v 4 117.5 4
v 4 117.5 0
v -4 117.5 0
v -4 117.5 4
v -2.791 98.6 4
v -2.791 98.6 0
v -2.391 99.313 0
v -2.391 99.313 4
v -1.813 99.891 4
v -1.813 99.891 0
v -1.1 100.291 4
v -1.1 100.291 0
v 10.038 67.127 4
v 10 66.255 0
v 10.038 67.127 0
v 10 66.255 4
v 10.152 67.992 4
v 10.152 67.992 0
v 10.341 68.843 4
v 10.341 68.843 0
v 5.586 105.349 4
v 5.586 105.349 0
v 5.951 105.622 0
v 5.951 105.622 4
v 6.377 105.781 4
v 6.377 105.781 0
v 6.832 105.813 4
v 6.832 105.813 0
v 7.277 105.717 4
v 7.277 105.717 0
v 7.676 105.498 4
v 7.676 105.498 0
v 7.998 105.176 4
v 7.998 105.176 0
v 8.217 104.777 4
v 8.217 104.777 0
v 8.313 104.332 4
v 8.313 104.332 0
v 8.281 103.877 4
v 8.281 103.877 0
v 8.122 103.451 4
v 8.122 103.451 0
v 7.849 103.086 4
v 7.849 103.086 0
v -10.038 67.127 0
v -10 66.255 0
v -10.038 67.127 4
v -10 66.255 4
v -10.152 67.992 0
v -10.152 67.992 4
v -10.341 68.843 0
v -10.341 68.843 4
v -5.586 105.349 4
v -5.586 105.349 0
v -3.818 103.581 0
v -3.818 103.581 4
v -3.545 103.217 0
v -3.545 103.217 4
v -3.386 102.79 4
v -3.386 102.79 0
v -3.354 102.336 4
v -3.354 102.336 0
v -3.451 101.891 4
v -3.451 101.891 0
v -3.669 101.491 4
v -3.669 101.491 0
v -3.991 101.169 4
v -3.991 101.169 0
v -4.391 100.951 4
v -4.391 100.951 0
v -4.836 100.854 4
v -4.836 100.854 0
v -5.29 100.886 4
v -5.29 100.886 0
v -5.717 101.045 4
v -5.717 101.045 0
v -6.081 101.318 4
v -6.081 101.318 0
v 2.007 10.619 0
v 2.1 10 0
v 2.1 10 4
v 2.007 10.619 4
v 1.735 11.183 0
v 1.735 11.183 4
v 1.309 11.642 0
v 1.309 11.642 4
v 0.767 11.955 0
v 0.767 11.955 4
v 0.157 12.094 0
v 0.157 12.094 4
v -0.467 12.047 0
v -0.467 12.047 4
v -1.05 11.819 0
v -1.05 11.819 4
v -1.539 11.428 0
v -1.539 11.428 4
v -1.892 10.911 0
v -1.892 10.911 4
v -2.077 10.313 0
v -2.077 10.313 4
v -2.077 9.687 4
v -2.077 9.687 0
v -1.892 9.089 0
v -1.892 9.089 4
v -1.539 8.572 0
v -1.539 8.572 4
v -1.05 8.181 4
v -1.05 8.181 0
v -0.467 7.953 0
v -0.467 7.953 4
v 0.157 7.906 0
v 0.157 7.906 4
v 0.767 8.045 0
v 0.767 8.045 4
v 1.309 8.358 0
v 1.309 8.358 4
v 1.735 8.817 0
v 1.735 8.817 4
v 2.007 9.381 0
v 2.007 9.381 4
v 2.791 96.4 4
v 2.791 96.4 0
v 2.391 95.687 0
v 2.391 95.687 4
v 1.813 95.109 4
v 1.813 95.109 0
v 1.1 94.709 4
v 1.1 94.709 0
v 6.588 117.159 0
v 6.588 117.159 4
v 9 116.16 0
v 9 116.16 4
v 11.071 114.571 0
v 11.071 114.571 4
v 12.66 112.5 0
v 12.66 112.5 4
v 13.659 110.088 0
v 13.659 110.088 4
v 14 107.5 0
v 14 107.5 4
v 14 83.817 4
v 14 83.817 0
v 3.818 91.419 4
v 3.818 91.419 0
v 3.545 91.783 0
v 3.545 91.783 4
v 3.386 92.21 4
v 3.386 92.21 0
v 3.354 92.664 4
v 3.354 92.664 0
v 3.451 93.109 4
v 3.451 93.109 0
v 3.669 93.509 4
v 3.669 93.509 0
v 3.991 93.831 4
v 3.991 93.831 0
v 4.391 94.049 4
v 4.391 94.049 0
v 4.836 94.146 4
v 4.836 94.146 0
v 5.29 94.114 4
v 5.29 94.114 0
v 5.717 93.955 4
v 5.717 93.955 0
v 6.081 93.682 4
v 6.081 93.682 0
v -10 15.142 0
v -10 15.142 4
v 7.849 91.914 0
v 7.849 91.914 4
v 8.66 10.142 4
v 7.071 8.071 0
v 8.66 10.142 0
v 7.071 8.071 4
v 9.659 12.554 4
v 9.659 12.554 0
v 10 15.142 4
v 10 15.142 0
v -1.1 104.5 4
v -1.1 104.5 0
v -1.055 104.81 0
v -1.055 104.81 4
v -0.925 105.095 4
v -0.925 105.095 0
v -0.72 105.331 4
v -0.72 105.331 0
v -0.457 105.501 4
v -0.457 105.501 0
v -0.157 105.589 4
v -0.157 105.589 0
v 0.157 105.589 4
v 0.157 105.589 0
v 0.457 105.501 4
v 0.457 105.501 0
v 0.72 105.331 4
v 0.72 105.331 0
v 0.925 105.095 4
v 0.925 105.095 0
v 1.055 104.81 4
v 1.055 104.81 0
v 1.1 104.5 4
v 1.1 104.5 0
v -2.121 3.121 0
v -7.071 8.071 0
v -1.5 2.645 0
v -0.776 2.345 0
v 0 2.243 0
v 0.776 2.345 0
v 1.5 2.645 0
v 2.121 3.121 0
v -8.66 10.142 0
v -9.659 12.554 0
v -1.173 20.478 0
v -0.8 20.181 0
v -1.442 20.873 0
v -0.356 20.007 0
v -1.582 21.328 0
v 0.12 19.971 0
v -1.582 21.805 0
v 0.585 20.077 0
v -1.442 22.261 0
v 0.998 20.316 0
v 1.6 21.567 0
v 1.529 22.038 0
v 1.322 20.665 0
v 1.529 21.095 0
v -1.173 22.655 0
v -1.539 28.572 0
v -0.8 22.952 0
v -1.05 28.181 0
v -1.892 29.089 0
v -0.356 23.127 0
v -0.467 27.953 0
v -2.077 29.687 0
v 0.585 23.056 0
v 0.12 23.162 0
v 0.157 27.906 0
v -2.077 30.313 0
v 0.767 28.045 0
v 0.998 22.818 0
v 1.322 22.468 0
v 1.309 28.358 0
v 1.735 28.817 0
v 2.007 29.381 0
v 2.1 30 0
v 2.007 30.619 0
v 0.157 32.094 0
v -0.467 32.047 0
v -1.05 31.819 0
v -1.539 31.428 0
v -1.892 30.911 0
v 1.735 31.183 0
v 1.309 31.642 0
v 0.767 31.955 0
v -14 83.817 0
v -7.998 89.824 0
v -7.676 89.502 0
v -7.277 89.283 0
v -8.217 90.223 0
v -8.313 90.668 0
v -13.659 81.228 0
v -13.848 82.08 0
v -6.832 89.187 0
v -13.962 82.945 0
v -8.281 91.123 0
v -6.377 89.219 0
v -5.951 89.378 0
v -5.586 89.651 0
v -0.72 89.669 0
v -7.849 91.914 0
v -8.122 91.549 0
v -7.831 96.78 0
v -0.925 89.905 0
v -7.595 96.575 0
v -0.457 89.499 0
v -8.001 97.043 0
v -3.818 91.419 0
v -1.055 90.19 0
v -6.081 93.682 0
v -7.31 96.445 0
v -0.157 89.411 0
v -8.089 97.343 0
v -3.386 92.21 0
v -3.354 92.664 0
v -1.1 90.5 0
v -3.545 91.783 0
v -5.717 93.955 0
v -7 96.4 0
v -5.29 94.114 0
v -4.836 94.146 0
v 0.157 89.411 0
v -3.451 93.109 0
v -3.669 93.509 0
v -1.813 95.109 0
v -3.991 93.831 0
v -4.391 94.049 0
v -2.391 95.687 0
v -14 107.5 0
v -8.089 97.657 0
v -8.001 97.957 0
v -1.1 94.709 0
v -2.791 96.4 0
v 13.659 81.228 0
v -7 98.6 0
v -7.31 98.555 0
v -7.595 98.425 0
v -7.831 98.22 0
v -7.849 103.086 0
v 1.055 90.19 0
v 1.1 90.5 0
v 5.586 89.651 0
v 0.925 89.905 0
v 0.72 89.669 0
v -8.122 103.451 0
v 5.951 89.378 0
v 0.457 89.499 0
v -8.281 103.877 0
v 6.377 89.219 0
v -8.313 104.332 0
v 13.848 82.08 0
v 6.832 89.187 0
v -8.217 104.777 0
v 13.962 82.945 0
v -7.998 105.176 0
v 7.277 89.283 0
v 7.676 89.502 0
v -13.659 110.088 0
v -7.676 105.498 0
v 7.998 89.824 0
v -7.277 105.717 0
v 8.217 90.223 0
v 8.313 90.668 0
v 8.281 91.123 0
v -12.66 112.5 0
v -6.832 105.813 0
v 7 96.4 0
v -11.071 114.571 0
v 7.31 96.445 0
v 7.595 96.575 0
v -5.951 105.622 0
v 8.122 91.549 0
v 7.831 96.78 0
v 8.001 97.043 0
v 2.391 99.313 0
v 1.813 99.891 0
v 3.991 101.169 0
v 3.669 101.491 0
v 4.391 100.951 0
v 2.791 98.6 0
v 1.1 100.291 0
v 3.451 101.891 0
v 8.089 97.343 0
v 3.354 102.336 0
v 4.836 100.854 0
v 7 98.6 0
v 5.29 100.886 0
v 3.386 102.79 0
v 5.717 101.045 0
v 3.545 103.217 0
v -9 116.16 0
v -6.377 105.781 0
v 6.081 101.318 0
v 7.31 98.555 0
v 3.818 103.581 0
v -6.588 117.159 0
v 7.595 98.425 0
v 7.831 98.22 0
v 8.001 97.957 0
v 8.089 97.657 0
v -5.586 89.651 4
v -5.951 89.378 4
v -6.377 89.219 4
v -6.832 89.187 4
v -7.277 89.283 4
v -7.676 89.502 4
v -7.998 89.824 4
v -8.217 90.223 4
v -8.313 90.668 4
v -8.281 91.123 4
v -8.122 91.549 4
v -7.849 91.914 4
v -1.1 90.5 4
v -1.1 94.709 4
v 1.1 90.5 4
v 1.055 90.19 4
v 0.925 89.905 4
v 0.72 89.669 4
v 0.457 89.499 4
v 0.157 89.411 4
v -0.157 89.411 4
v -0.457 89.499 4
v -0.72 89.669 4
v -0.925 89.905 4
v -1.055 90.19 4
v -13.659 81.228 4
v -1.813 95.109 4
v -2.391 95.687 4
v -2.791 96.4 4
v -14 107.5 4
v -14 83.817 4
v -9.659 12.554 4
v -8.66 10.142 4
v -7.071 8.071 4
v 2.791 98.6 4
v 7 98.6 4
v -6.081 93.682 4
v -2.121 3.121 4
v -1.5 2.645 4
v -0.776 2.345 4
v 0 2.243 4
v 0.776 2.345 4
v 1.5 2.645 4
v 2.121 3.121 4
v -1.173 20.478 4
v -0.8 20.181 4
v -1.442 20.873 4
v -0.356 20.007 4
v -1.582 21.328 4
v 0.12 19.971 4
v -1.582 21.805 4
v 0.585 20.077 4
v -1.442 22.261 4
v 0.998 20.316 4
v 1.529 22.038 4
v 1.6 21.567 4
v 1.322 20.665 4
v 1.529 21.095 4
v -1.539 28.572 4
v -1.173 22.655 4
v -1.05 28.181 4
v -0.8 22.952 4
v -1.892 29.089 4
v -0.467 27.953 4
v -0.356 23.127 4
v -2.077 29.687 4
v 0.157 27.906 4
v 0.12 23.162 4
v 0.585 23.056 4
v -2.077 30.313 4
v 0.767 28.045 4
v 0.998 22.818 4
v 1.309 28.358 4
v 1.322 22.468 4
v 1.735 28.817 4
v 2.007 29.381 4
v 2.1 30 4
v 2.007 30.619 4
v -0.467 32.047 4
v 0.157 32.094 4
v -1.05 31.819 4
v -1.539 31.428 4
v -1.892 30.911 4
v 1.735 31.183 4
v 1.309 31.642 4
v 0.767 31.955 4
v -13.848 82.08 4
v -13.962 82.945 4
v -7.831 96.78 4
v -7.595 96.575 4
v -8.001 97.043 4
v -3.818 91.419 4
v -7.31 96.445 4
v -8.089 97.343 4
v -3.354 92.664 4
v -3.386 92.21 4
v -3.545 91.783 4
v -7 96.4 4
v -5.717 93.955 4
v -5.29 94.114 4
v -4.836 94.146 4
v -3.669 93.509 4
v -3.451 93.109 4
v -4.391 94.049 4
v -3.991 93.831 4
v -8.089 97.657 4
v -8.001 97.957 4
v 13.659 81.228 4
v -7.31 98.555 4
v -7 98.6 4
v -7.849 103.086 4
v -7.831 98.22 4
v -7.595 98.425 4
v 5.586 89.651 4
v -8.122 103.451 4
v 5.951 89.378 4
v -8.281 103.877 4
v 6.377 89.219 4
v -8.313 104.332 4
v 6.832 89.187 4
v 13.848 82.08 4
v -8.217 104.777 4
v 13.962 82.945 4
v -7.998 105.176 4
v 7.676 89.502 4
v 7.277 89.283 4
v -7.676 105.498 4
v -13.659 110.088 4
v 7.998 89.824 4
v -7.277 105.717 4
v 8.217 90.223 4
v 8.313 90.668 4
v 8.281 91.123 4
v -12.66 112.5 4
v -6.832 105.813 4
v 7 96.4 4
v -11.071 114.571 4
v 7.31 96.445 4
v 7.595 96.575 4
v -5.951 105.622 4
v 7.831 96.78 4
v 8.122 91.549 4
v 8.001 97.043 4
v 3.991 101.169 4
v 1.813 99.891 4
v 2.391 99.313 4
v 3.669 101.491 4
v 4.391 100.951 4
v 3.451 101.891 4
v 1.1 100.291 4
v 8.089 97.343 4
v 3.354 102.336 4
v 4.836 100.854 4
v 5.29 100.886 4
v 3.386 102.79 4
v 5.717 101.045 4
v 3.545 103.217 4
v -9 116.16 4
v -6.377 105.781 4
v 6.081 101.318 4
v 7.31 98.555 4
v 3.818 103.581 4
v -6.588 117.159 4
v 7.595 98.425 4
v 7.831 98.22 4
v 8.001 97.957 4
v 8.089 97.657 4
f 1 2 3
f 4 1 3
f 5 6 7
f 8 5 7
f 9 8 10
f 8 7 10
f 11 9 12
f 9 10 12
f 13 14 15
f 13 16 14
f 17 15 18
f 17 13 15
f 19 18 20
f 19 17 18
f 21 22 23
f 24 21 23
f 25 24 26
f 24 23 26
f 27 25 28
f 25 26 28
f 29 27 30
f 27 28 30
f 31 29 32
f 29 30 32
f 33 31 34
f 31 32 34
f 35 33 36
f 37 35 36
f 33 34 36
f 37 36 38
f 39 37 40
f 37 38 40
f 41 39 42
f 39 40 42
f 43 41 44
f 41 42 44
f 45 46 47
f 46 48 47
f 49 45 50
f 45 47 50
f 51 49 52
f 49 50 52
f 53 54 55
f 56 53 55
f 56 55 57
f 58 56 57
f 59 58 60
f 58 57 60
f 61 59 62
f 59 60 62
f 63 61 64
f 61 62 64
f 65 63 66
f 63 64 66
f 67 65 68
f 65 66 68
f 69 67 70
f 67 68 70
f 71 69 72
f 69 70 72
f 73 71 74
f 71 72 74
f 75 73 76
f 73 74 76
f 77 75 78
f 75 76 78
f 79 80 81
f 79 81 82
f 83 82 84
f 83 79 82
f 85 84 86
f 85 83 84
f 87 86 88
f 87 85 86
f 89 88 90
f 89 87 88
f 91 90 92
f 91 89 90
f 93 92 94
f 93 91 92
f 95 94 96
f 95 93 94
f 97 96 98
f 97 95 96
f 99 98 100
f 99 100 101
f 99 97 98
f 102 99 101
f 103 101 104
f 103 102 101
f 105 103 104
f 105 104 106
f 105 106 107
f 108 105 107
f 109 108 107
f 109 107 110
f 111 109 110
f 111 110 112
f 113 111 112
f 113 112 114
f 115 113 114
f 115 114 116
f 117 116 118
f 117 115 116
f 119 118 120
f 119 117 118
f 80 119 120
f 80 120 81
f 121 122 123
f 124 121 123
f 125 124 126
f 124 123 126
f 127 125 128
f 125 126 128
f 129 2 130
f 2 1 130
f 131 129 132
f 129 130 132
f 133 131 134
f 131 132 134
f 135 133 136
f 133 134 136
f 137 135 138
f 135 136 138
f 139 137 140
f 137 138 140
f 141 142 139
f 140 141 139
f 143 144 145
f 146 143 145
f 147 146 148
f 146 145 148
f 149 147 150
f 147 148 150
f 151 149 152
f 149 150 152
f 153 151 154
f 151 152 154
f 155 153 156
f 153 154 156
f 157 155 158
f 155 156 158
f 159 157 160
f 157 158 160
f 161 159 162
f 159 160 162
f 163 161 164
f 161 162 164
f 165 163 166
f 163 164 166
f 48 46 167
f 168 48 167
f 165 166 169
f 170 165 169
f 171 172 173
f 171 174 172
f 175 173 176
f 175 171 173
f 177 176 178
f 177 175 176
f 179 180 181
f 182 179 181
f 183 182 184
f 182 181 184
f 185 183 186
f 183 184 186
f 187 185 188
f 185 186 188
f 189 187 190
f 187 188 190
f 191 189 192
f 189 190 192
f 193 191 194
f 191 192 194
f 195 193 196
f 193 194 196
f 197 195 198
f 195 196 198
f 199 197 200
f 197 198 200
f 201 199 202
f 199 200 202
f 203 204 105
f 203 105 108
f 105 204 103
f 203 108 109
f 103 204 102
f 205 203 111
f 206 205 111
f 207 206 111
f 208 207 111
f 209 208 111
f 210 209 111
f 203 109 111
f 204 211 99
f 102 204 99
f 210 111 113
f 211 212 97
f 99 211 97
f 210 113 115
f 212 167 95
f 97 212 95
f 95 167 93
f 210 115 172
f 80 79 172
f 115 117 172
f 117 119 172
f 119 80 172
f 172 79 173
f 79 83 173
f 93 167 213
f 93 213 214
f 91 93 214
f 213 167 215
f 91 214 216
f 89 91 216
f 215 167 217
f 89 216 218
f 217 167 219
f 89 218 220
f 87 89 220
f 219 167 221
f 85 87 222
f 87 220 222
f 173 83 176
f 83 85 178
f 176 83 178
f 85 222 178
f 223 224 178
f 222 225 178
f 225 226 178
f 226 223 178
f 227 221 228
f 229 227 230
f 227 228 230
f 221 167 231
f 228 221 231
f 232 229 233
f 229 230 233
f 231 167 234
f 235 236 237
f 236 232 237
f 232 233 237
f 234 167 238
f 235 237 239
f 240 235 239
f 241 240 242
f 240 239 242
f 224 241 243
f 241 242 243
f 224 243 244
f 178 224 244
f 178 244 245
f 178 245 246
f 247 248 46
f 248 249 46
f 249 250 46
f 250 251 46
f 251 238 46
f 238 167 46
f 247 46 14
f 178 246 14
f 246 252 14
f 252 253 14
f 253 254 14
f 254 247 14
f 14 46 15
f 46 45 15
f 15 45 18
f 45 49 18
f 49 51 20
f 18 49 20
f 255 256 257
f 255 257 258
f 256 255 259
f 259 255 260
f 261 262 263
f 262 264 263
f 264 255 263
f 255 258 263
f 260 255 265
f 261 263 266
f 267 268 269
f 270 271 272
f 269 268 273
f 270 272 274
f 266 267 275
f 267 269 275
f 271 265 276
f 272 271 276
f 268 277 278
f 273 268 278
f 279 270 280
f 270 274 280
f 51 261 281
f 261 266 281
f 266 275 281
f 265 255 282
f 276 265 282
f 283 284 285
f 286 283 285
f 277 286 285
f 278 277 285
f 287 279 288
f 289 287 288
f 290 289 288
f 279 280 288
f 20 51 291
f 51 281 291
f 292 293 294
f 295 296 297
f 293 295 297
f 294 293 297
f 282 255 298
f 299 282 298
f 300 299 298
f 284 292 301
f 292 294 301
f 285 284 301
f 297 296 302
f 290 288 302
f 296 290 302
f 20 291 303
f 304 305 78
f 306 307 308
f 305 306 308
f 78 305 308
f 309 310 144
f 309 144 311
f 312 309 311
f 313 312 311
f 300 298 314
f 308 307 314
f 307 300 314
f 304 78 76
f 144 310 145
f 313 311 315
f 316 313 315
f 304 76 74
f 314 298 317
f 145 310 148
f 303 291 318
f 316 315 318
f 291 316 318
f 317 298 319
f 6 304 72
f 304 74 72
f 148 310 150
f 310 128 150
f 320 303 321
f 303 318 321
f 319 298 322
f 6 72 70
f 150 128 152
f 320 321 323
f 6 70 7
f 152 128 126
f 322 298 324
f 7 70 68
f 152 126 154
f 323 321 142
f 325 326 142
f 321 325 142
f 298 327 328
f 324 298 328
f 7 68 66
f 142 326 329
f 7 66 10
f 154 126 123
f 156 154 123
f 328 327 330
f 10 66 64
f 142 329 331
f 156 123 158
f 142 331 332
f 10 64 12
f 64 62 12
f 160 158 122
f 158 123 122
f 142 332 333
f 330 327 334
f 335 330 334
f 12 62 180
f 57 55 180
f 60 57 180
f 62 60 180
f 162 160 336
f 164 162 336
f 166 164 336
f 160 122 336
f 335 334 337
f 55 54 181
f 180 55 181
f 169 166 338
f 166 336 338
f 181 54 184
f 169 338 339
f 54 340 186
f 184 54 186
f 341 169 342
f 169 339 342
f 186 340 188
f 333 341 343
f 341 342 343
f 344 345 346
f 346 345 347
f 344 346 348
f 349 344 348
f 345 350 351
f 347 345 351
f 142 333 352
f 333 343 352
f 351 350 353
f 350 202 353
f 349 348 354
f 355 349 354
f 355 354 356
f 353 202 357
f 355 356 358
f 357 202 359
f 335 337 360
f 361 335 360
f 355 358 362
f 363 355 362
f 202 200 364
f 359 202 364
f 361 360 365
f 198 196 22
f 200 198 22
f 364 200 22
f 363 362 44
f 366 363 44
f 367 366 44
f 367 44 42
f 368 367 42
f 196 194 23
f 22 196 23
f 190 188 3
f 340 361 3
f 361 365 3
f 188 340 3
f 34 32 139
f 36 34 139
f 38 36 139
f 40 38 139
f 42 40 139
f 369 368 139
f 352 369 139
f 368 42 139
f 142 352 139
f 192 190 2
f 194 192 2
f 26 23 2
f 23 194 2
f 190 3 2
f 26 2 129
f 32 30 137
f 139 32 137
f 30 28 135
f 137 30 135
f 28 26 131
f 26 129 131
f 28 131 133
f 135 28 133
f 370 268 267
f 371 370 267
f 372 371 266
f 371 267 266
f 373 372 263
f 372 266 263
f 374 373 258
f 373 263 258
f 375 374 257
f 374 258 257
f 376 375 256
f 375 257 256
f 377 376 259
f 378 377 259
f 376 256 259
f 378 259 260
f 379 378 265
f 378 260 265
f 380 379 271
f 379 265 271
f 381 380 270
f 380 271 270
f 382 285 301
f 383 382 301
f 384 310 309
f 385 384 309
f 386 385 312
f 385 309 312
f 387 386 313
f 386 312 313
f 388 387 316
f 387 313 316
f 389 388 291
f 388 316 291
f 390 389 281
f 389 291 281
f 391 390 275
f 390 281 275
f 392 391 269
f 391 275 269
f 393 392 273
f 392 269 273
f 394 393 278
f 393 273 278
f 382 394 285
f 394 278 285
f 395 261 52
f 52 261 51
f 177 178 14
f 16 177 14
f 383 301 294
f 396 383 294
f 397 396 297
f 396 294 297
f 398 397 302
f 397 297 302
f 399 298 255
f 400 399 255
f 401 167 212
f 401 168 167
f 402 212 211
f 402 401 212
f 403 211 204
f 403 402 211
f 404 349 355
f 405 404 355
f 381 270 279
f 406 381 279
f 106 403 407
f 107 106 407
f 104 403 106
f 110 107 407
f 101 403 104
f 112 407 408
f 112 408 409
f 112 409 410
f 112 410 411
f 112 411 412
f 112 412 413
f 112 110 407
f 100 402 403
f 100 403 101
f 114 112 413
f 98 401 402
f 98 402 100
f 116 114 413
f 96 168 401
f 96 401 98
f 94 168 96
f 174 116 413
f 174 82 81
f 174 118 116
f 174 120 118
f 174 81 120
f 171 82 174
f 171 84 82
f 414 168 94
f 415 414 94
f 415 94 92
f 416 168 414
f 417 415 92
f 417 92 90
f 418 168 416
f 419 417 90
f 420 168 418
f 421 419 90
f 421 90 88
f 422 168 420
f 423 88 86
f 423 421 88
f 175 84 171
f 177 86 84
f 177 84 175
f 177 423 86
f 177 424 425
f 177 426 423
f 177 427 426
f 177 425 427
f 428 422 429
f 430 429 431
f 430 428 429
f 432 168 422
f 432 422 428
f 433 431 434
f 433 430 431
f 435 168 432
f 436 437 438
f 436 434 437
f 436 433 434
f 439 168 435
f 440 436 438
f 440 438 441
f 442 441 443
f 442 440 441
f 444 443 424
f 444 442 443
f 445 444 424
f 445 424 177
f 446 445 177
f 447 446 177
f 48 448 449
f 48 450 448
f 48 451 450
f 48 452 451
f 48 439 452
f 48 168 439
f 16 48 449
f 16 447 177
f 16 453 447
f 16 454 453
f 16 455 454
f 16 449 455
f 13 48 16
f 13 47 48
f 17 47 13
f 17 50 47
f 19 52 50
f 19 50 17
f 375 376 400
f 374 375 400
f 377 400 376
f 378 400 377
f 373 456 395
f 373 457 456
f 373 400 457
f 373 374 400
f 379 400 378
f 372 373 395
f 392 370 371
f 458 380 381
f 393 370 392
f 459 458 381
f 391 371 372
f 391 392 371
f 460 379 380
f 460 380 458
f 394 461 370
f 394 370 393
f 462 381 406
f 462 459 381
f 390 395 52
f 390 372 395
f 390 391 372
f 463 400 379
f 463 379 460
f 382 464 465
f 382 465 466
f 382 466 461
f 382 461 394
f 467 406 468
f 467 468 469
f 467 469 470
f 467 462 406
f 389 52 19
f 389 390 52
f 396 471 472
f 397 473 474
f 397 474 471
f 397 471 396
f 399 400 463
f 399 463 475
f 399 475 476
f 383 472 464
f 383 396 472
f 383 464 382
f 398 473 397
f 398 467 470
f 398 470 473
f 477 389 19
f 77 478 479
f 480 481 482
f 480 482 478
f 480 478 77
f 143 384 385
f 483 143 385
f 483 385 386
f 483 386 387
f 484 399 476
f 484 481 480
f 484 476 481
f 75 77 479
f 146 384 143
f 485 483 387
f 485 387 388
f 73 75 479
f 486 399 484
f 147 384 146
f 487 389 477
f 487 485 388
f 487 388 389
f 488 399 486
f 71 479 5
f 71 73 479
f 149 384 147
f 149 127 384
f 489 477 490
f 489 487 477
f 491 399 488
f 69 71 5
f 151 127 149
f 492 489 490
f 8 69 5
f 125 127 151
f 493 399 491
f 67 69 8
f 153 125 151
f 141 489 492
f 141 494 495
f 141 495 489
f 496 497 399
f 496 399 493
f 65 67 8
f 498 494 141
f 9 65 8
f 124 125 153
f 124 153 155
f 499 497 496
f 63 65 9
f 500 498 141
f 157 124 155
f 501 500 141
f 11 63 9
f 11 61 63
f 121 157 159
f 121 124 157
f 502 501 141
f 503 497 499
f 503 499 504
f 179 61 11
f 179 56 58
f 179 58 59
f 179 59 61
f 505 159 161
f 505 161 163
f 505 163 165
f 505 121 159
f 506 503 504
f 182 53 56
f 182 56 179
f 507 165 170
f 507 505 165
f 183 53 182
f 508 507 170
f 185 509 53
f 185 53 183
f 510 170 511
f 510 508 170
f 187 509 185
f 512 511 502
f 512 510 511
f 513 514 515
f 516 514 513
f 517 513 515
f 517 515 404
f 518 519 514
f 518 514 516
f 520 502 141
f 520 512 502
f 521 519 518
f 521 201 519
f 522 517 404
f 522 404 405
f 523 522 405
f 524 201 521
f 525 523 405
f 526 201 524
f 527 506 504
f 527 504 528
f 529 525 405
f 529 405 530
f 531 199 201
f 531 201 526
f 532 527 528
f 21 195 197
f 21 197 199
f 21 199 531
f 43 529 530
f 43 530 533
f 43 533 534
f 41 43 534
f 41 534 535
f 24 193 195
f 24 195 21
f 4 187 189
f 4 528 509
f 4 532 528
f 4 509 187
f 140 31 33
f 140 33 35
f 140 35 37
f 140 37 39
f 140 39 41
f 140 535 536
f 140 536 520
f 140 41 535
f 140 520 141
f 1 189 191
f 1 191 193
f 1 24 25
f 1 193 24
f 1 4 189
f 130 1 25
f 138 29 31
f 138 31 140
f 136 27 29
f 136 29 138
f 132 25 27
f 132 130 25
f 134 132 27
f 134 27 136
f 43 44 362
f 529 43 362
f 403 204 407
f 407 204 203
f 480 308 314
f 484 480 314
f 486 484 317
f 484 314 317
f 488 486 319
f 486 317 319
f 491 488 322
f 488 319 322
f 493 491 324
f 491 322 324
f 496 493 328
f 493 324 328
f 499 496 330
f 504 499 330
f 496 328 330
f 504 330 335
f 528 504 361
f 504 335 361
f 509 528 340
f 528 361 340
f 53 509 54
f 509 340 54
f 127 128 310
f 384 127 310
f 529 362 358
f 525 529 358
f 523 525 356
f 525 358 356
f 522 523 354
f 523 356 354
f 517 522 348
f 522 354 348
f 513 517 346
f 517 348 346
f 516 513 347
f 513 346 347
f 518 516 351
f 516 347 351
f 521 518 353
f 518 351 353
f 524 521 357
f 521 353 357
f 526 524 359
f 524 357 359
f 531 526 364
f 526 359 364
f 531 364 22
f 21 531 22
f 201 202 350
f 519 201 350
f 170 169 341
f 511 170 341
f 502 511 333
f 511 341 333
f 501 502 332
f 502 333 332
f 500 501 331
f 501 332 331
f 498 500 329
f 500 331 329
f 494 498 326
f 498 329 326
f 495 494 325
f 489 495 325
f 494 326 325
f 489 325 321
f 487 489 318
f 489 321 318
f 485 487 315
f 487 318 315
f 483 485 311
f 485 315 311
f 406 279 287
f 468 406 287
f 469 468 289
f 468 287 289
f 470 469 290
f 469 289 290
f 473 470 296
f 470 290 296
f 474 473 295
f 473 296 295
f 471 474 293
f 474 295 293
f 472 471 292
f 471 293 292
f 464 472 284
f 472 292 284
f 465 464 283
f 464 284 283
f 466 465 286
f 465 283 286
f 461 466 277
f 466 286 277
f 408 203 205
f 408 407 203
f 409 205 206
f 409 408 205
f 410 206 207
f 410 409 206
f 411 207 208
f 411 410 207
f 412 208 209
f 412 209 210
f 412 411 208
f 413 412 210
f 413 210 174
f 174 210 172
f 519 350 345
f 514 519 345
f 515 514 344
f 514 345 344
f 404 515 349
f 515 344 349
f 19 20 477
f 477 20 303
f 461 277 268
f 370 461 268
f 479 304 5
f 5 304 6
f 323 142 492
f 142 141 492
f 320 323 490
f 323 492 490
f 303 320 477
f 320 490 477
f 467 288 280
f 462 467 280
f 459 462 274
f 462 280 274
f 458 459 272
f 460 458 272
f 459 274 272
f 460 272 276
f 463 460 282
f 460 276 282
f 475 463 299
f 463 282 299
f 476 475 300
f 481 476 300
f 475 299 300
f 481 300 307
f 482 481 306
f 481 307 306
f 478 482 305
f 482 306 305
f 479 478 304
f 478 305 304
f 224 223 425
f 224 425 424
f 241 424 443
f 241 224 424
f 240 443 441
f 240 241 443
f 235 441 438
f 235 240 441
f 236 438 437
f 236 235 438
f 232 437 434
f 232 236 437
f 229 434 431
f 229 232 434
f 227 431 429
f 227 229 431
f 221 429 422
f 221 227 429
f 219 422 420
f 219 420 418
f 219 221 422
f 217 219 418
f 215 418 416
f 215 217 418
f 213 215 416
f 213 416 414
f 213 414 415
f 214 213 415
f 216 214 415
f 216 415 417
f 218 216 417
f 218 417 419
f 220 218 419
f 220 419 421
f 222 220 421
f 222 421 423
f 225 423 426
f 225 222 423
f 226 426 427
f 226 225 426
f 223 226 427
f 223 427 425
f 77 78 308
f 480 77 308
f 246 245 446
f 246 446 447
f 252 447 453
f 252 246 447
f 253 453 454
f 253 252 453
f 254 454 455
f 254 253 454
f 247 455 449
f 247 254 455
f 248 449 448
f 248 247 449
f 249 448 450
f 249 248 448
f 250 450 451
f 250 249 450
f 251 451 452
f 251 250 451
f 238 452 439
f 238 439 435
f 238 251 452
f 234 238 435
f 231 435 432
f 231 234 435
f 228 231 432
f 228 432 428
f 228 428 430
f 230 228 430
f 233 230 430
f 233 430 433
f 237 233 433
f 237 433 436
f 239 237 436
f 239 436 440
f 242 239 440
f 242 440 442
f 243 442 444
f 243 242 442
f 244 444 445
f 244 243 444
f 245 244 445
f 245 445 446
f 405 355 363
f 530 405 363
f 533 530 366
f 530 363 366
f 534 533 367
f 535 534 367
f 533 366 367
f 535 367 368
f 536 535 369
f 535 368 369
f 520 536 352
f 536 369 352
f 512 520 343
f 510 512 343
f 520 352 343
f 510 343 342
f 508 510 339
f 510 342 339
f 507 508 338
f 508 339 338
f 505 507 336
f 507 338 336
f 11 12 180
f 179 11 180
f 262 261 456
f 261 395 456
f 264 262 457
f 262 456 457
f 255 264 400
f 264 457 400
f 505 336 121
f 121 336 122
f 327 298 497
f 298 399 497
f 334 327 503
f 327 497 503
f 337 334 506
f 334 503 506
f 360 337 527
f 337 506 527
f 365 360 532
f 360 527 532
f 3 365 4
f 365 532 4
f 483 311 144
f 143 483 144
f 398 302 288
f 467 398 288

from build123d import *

# Parameters (mm, degrees)
F0_R     = 2.1
F0_R_2   = 1.6
F1_DEPTH = 4
F2_R     = 10
F3_R     = 3


with BuildPart() as f1:
    # F0 (on Top) → F1 (new body)
    with BuildSketch(Plane.XY):
        Polygon((-10, 67.571797), (-10, 11), (0, 1), (10, 11), (10, 67.571797), (14, 82.5), (14, 117.5), (-14, 117.5), (-14, 82.5), align=None)
        with Locations((0, 10)):
            Circle(F0_R, mode=Mode.SUBTRACT)
        with Locations((0, 21.566757)):
            Circle(F0_R_2, mode=Mode.SUBTRACT)
        with Locations((0, 30)):
            Circle(F0_R, mode=Mode.SUBTRACT)
        with BuildLine():
            ThreePointArc((-5.586144, 89.651115), (-7.848885, 89.651115), (-7.848885, 91.913856))
            Line((-7.848885, 91.913856), (-6.081118, 93.681623))
            ThreePointArc((-6.081118, 93.681623), (-3.818377, 93.681623), (-3.818377, 91.418882))
            Line((-3.818377, 91.418882), (-5.586144, 89.651115))
        make_face(mode=Mode.SUBTRACT)
        with BuildLine():
            ThreePointArc((-7.848885, 103.086144), (-7.848885, 105.348885), (-5.586144, 105.348885))
            Line((-5.586144, 105.348885), (-3.818377, 103.581118))
            ThreePointArc((-3.818377, 103.581118), (-3.818377, 101.318377), (-6.081118, 101.318377))
            Line((-6.081118, 101.318377), (-7.848885, 103.086144))
        make_face(mode=Mode.SUBTRACT)
        with BuildLine():
            ThreePointArc((1.1, 100.291057), (2.12132, 99.62132), (2.791057, 98.6))
            Line((2.791057, 98.6), (7, 98.6))
            ThreePointArc((7, 98.6), (8.1, 97.5), (7, 96.4))
            Line((7, 96.4), (2.791057, 96.4))
            ThreePointArc((2.791057, 96.4), (2.12132, 95.37868), (1.1, 94.708943))
            Line((1.1, 94.708943), (1.1, 90.5))
            ThreePointArc((1.1, 90.5), (0, 89.4), (-1.1, 90.5))
            Line((-1.1, 90.5), (-1.1, 94.708943))
            ThreePointArc((-1.1, 94.708943), (-2.12132, 95.37868), (-2.791057, 96.4))
            Line((-2.791057, 96.4), (-7, 96.4))
            ThreePointArc((-7, 96.4), (-8.1, 97.5), (-7, 98.6))
            Line((-7, 98.6), (-2.791057, 98.6))
            ThreePointArc((-2.791057, 98.6), (-2.12132, 99.62132), (-1.1, 100.291057))
            Line((-1.1, 100.291057), (-1.1, 104.5))
            ThreePointArc((-1.1, 104.5), (0, 105.6), (1.1, 104.5))
            Line((1.1, 104.5), (1.1, 100.291057))
        make_face(mode=Mode.SUBTRACT)
        with BuildLine():
            ThreePointArc((7.848885, 91.913856), (7.848885, 89.651115), (5.586144, 89.651115))
            Line((5.586144, 89.651115), (3.818377, 91.418882))
            ThreePointArc((3.818377, 91.418882), (3.818377, 93.681623), (6.081118, 93.681623))
            Line((6.081118, 93.681623), (7.848885, 91.913856))
        make_face(mode=Mode.SUBTRACT)
        with BuildLine():
            ThreePointArc((5.586144, 105.348885), (7.848885, 105.348885), (7.848885, 103.086144))
            Line((7.848885, 103.086144), (6.081118, 101.318377))
            ThreePointArc((6.081118, 101.318377), (3.818377, 101.318377), (3.818377, 103.581118))
            Line((3.818377, 103.581118), (5.586144, 105.348885))
        make_face(mode=Mode.SUBTRACT)
    extrude(amount=F1_DEPTH)

    # F2
    f2_edges = [f1.edges().sort_by_distance(p)[0] for p in [
        (-14, 82.5, 2),
        (-10, 67.571797, 2),
        (-10, 11, 2),
        (10, 11, 2),
        (10, 67.571797, 2),
        (14, 82.5, 2),
        (-14, 117.5, 2),
        (14, 117.5, 2),
    ]]
    fillet(f2_edges, radius=F2_R)

    # F3
    f3_edges = [f1.edges().sort_by_distance(p)[0] for p in [
        (0, 1, 2),
    ]]
    fillet(f3_edges, radius=F3_R)


solid = f1.part
